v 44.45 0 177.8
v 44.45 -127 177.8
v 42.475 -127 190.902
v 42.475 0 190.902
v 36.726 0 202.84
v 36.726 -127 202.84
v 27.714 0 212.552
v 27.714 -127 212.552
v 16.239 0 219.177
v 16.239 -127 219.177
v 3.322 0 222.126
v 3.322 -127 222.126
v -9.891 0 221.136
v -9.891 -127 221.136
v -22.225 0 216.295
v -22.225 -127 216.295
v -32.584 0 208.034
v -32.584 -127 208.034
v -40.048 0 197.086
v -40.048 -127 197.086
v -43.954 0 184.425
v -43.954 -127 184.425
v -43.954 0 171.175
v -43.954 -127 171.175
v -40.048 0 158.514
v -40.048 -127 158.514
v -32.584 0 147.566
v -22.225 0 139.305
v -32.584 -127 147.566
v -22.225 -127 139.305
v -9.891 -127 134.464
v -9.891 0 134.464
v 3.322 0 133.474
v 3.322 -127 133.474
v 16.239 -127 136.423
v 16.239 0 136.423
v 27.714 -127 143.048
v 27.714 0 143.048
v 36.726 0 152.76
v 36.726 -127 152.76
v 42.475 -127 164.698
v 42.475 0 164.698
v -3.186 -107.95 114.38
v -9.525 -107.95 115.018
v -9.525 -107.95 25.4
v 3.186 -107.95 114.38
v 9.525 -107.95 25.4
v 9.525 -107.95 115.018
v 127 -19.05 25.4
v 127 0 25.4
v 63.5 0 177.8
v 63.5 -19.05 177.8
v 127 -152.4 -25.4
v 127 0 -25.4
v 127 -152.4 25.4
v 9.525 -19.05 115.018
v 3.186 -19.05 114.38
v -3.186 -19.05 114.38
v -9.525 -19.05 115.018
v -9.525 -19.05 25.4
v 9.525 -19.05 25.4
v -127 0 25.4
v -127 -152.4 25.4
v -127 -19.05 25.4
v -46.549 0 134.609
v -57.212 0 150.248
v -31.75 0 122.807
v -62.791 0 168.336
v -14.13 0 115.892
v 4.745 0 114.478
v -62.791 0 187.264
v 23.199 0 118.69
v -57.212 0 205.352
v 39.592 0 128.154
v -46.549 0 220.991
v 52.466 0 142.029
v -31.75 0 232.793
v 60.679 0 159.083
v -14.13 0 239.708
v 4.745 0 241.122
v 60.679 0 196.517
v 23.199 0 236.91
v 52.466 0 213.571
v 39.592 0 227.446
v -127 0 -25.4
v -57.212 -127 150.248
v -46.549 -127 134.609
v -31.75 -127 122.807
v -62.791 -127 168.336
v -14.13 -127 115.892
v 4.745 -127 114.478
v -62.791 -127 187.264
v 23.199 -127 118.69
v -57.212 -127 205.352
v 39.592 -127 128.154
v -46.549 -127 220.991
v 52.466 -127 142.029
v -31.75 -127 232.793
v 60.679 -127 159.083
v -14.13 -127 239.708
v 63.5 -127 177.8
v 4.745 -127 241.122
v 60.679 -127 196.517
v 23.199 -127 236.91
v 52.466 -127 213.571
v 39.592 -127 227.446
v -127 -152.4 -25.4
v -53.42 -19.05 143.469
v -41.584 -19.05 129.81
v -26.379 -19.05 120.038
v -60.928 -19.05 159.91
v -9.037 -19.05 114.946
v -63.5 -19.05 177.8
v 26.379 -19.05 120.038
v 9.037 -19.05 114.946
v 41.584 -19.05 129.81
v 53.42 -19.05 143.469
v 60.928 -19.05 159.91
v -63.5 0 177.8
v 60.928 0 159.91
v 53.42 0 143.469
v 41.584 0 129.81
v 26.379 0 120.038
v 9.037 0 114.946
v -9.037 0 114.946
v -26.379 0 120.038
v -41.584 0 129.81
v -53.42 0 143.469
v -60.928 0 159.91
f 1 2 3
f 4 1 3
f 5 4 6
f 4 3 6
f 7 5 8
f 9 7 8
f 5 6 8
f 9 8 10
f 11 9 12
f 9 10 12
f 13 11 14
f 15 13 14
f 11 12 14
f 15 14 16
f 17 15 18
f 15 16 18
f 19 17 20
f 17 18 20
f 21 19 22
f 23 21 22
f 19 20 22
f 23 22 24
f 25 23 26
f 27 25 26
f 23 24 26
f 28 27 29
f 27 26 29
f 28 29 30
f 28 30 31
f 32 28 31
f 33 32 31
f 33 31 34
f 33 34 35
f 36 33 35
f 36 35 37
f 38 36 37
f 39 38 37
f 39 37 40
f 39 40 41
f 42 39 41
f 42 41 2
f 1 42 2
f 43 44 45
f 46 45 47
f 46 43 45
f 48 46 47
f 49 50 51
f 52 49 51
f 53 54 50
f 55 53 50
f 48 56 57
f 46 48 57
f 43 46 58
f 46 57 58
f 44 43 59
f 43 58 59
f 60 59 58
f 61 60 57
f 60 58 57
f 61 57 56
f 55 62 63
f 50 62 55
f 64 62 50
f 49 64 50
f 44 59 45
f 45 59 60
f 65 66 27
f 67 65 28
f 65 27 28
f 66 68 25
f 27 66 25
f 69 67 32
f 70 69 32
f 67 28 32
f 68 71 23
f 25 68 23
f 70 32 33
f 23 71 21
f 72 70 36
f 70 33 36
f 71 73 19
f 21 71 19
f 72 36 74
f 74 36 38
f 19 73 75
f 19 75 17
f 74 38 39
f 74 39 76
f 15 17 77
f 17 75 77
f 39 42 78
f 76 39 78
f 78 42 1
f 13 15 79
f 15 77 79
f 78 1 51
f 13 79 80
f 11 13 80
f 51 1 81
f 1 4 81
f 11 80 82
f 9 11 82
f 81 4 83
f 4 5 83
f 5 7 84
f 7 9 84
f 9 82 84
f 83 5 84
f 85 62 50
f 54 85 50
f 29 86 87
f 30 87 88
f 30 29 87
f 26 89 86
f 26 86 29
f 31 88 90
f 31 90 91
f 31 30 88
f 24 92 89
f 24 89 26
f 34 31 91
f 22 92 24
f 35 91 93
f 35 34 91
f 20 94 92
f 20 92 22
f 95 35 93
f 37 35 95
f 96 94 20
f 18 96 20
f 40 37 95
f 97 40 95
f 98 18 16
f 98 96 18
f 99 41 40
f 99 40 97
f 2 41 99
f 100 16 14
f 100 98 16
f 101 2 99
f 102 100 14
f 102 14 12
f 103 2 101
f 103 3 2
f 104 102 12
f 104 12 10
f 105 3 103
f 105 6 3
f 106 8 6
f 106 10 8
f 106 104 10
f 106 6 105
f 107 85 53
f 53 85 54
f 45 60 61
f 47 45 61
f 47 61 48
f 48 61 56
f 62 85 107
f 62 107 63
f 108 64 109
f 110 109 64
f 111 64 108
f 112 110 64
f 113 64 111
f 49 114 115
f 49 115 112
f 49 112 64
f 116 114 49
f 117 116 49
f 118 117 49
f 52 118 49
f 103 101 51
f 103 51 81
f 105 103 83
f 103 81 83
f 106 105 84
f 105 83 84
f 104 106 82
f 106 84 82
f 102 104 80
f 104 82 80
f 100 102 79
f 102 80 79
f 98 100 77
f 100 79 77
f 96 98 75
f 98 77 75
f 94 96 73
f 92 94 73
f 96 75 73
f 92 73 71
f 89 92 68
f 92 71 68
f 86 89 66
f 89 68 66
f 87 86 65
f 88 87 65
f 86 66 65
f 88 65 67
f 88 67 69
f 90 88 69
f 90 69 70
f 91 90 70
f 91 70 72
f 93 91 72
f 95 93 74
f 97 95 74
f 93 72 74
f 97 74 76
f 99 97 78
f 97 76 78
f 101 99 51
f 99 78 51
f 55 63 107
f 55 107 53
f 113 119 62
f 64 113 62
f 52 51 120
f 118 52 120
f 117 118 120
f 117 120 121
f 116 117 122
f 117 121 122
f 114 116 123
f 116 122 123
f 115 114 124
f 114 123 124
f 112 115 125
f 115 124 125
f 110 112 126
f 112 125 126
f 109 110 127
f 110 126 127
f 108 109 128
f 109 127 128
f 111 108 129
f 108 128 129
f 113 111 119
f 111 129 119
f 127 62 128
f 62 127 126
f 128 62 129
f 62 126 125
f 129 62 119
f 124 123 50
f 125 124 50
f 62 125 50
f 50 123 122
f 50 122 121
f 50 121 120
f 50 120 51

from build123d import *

# Parameters (mm, degrees)
F0_W     = 254
F0_H     = 50.8
F1_DEPTH = 152.4
F2_DEPTH = 127
F3_DEPTH = 19.05
F4_R     = 44.45
F5_DEPTH = 127.001
F7_DEPTH = 88.9


with BuildPart() as f1:
    # F0 (on Front) → F1 (new body)
    with BuildSketch(Plane.XZ):
        Rectangle(F0_W, F0_H)
    extrude(amount=F1_DEPTH)


with BuildPart() as f2:
    # F0 (on Front) → F2 (new body)
    with BuildSketch(Plane.XZ):
        with BuildLine():
            ThreePointArc((-63.5, 177.8), (0, 114.3), (63.5, 177.8))
            ThreePointArc((63.5, 177.8), (0, 241.3), (-63.5, 177.8))
        make_face()
    extrude(amount=F2_DEPTH)

    # F4 (on face) → F5 (cut, through all)
    with BuildSketch(Plane.XZ.offset(127)):
        with Locations((0, 177.8)):
            Circle(F4_R)
    extrude(amount=-F5_DEPTH, mode=Mode.SUBTRACT)


with BuildPart() as f3:
    # F0 (on Front) → F3 (new body)
    with BuildSketch(Plane.XZ):
        with BuildLine():
            Line((-127, 25.4), (127, 25.4))
            Line((127, 25.4), (63.5, 177.8))
            ThreePointArc((63.5, 177.8), (0, 114.3), (-63.5, 177.8))
            Line((-63.5, 177.8), (-127, 25.4))
        make_face()
    extrude(amount=F3_DEPTH)


with BuildPart() as f7:
    # F6 (on face) → F7 (new body)
    with BuildSketch(Plane.XZ.offset(19.05)):
        with BuildLine():
            ThreePointArc((9.525, 115.018439), (0, 114.3), (-9.525, 115.018439))
            Line((-9.525, 115.018439), (-9.525, 25.4))
            Line((-9.525, 25.4), (9.525, 25.4))
            Line((9.525, 25.4), (9.525, 115.018439))
        make_face()
    extrude(amount=F7_DEPTH)


solid = Compound([f1.part, f2.part, f3.part, f7.part])
